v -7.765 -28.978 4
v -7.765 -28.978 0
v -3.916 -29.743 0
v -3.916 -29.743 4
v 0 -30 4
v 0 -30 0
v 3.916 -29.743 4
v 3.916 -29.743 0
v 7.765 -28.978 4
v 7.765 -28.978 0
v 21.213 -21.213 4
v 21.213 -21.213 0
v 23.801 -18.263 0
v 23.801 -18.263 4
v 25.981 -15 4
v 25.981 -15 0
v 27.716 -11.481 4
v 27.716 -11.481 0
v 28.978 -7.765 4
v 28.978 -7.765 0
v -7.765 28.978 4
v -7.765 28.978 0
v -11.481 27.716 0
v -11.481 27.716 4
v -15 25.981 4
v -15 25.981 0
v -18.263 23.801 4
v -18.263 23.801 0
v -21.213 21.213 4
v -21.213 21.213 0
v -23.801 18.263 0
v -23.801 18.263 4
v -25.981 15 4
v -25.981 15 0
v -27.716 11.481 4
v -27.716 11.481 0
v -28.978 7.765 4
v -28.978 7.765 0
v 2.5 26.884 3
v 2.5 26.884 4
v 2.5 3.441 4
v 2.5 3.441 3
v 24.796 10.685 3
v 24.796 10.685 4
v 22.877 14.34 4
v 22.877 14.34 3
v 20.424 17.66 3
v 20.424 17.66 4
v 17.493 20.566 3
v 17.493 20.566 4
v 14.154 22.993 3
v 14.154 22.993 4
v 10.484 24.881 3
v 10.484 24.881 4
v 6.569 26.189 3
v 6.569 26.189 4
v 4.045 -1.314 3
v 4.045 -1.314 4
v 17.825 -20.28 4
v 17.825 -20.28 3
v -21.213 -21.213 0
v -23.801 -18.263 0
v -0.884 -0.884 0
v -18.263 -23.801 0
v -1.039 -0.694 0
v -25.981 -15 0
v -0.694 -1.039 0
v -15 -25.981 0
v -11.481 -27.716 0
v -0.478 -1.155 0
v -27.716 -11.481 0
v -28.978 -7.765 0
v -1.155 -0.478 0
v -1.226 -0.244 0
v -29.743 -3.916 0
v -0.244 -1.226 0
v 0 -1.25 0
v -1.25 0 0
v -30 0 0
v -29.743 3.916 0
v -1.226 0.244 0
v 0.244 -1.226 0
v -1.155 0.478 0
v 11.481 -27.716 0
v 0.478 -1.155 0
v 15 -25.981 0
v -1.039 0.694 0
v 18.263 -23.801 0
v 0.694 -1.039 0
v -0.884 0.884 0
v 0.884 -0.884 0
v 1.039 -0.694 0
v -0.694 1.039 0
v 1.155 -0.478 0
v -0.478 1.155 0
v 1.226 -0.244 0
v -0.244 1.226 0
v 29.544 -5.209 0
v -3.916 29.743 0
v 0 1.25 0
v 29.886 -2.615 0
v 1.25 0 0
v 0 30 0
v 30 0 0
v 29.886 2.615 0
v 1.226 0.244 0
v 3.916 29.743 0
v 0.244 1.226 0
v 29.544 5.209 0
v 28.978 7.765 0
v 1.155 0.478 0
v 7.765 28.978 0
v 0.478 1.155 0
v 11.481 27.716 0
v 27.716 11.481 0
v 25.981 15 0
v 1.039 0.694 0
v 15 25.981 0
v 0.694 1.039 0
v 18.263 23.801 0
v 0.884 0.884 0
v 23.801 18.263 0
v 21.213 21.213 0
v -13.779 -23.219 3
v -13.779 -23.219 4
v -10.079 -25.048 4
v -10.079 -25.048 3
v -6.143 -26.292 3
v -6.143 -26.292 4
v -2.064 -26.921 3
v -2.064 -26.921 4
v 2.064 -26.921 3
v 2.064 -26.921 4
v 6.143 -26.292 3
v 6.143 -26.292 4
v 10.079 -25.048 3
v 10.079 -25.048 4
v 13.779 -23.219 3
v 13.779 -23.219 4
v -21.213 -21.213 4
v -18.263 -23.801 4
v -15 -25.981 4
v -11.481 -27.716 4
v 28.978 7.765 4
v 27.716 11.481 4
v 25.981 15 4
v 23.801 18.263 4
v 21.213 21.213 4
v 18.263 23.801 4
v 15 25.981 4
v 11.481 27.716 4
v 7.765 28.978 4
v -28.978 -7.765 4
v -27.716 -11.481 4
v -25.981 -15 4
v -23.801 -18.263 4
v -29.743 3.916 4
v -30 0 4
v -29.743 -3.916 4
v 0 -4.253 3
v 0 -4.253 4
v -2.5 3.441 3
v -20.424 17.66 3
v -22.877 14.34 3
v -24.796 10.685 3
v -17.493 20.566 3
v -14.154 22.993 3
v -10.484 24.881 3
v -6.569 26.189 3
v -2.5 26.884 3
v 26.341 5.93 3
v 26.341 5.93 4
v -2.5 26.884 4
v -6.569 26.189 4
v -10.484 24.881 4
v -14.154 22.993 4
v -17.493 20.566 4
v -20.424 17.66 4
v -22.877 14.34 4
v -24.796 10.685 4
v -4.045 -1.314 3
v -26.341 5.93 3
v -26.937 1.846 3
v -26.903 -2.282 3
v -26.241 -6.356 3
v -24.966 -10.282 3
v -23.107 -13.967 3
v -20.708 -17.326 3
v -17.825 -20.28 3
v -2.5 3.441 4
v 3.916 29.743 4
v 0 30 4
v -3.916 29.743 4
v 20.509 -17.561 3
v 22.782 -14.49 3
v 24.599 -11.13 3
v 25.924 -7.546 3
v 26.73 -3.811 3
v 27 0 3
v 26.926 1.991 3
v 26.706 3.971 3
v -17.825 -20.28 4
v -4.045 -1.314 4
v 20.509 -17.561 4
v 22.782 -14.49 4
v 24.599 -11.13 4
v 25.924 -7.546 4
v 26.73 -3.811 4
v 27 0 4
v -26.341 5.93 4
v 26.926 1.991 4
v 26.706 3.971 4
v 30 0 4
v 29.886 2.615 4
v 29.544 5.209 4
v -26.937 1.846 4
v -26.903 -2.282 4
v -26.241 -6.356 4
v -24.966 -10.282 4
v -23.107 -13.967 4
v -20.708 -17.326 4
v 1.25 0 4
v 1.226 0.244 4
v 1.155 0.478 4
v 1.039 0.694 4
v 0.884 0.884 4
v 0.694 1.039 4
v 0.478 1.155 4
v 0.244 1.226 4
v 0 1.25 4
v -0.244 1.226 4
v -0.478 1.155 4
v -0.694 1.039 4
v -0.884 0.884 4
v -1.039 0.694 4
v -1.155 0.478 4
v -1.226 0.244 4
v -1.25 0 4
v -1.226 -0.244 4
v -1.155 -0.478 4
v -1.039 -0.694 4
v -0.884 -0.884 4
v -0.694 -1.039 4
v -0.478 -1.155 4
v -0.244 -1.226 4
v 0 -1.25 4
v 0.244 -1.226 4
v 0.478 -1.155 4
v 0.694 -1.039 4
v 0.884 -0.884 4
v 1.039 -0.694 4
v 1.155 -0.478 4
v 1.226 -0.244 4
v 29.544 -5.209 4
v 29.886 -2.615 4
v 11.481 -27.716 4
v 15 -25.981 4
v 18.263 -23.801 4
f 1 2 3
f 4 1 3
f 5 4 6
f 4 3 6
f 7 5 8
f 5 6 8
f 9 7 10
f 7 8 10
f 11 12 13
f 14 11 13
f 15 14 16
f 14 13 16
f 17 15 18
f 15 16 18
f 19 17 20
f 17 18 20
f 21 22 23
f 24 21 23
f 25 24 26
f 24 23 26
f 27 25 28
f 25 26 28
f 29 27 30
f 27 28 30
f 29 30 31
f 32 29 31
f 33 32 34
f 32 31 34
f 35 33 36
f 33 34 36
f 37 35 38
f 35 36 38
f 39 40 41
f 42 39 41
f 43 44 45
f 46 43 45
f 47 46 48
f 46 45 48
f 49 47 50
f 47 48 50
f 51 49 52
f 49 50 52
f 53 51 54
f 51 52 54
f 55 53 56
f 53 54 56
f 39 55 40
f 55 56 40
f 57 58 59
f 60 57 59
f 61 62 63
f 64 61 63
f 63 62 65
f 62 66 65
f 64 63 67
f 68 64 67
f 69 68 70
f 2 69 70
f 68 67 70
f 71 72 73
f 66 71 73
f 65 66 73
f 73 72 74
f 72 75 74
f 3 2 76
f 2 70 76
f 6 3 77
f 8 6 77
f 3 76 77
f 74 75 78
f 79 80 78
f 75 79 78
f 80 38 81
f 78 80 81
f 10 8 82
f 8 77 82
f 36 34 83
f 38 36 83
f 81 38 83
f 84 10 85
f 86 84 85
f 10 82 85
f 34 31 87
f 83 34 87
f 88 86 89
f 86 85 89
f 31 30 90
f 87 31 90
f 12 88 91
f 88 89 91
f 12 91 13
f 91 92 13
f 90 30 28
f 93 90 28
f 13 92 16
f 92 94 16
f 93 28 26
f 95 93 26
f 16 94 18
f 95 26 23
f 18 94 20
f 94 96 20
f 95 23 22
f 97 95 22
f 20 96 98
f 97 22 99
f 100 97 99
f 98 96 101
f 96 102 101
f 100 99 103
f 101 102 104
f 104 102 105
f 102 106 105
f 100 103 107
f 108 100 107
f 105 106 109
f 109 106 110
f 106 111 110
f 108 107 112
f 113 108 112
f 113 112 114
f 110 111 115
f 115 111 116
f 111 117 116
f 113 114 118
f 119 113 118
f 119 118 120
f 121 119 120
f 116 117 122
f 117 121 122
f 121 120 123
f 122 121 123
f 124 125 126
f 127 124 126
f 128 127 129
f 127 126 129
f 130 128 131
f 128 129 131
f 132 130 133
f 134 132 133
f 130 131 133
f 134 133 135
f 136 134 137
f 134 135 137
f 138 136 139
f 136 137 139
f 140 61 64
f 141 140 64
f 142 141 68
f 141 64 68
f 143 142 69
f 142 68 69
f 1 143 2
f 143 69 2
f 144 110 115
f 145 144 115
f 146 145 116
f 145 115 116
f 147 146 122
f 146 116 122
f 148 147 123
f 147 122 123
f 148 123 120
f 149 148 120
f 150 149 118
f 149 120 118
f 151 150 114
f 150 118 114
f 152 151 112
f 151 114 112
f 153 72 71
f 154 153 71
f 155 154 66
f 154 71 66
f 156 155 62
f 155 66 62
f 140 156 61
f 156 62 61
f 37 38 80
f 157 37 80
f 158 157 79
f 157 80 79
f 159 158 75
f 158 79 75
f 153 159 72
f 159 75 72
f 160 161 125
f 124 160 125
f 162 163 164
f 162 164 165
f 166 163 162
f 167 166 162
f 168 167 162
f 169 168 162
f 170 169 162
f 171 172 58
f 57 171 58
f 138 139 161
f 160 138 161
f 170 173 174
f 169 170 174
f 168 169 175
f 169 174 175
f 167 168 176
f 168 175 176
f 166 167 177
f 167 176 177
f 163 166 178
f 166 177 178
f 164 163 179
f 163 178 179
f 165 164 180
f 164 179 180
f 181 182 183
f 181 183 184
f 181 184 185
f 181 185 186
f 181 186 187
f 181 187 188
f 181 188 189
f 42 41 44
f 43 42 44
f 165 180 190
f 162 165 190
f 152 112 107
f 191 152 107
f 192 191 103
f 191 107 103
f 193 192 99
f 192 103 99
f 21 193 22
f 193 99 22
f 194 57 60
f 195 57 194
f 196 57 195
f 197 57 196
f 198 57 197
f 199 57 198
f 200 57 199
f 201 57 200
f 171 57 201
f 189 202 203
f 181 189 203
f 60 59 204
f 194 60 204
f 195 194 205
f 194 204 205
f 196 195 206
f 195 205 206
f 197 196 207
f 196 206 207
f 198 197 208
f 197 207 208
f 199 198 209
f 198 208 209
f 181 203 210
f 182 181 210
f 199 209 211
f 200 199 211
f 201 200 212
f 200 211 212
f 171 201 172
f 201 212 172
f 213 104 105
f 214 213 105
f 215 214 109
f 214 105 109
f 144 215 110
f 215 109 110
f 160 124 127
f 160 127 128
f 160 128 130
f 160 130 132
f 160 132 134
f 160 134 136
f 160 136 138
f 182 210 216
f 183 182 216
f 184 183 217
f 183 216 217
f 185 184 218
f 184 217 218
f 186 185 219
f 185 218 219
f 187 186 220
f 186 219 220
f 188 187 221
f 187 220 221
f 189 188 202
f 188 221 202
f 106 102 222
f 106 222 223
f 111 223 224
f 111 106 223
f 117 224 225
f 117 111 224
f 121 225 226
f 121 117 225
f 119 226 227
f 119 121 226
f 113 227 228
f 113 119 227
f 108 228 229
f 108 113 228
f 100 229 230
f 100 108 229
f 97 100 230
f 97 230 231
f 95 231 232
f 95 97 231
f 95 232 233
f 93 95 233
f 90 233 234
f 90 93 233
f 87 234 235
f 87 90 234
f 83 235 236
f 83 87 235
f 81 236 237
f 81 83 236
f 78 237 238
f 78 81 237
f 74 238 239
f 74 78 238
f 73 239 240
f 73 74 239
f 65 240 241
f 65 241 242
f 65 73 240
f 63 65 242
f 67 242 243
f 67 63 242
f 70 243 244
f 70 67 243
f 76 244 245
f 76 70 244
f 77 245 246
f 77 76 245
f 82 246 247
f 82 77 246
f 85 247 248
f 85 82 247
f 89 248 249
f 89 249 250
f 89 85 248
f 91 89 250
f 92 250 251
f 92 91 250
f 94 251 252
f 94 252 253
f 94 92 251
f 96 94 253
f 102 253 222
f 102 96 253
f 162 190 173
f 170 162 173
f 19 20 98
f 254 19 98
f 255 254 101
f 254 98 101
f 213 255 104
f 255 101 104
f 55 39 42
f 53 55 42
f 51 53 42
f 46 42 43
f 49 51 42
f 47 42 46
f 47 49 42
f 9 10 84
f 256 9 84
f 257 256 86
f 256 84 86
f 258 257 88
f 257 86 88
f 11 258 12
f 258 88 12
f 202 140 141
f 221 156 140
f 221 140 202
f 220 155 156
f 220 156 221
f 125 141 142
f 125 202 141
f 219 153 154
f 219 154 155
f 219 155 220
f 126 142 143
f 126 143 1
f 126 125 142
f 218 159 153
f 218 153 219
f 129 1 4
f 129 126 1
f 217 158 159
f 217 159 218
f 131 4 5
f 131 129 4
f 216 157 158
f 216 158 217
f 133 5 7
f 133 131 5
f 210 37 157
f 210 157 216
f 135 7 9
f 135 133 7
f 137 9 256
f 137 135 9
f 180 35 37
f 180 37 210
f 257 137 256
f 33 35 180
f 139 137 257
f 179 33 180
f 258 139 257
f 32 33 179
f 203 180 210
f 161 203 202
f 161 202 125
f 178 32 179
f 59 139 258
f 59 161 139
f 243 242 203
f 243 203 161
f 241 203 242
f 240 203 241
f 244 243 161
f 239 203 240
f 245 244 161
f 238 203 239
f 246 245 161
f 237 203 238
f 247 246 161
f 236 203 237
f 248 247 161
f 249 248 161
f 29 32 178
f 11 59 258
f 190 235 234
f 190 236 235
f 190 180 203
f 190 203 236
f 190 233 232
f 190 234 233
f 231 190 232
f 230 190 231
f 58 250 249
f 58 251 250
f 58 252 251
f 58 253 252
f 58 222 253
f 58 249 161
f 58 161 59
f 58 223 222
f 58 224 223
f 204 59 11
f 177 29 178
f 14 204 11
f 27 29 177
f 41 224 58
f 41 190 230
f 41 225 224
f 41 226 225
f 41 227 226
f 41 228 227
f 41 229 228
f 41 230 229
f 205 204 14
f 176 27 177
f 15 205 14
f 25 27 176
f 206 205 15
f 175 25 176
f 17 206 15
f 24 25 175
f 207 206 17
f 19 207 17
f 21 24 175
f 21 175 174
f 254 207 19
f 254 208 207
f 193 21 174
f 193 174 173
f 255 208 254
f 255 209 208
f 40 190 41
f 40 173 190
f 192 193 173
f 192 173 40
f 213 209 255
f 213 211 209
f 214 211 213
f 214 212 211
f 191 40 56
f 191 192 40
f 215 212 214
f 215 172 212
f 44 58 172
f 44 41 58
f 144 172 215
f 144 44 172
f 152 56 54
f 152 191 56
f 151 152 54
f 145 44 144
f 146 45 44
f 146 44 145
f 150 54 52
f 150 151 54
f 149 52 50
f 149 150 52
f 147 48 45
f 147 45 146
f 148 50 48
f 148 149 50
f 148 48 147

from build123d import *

# Parameters (mm, degrees)
F0_R     = 1.25
F1_DEPTH = 4
F3_DEPTH = 1


with BuildPart() as f1:
    # F0 (on Top) → F1 (new body)
    with BuildSketch(Plane.XY):
        Polygon((20, 0), (28.9777747887, 7.7645713531), (17.3205080757, 10), (21.2132034356, 21.2132034356), (10, 17.3205080757), (7.7645713531, 28.9777747887), (0, 20), (-7.7645713531, 28.9777747887), (-10, 17.3205080757), (-21.2132034356, 21.2132034356), (-17.3205080757, 10), (-28.9777747887, 7.7645713531), (-20, 0), (-28.9777747887, -7.7645713531), (-17.3205080757, -10), (-21.2132034356, -21.2132034356), (-10, -17.3205080757), (-7.7645713531, -28.9777747887), (0, -20), (7.7645713531, -28.9777747887), (10, -17.3205080757), (21.2132034356, -21.2132034356), (17.3205080757, -10), (28.9777747887, -7.7645713531), align=None)
        Circle(F0_R, mode=Mode.SUBTRACT)
        with BuildLine():
            Line((-20, 0), (-28.9777747887, 7.7645713531))
            ThreePointArc((-28.9777747887, 7.7645713531), (-30, 0), (-28.9777747887, -7.7645713531))
            Line((-28.9777747887, -7.7645713531), (-20, 0))
        make_face()
        with BuildLine():
            Line((-17.3205080757, 10), (-21.2132034356, 21.2132034356))
            ThreePointArc((-21.2132034356, 21.2132034356), (-25.9807621135, 15), (-28.9777747887, 7.7645713531))
            Line((-28.9777747887, 7.7645713531), (-17.3205080757, 10))
        make_face()
        with BuildLine():
            Line((-10, 17.3205080757), (-7.7645713531, 28.9777747887))
            ThreePointArc((-7.7645713531, 28.9777747887), (-15, 25.9807621135), (-21.2132034356, 21.2132034356))
            Line((-21.2132034356, 21.2132034356), (-10, 17.3205080757))
        make_face()
        with BuildLine():
            Line((0, 20), (7.7645713531, 28.9777747887))
            ThreePointArc((7.7645713531, 28.9777747887), (0, 30), (-7.7645713531, 28.9777747887))
            Line((-7.7645713531, 28.9777747887), (0, 20))
        make_face()
        with BuildLine():
            Line((10, 17.3205080757), (21.2132034356, 21.2132034356))
            ThreePointArc((21.2132034356, 21.2132034356), (15, 25.9807621135), (7.7645713531, 28.9777747887))
            Line((7.7645713531, 28.9777747887), (10, 17.3205080757))
        make_face()
        with BuildLine():
            Line((17.3205080757, 10), (28.9777747887, 7.7645713531))
            ThreePointArc((28.9777747887, 7.7645713531), (25.9807621135, 15), (21.2132034356, 21.2132034356))
            Line((21.2132034356, 21.2132034356), (17.3205080757, 10))
        make_face()
        with BuildLine():
            ThreePointArc((28.9777747887, -7.7645713531), (29.7433458412, -3.9157857666), (30, 0))
            ThreePointArc((30, 0), (29.7433458412, 3.9157857666), (28.9777747887, 7.7645713531))
            Line((28.9777747887, 7.7645713531), (20, 0))
            Line((20, 0), (28.9777747887, -7.7645713531))
        make_face()
        with BuildLine():
            ThreePointArc((21.2132034356, -21.2132034356), (25.9807621135, -15), (28.9777747887, -7.7645713531))
            Line((28.9777747887, -7.7645713531), (17.3205080757, -10))
            Line((17.3205080757, -10), (21.2132034356, -21.2132034356))
        make_face()
        with BuildLine():
            ThreePointArc((7.7645713531, -28.9777747887), (15, -25.9807621135), (21.2132034356, -21.2132034356))
            Line((21.2132034356, -21.2132034356), (10, -17.3205080757))
            Line((10, -17.3205080757), (7.7645713531, -28.9777747887))
        make_face()
        with BuildLine():
            ThreePointArc((-7.7645713531, -28.9777747887), (0, -30), (7.7645713531, -28.9777747887))
            Line((7.7645713531, -28.9777747887), (0, -20))
            Line((0, -20), (-7.7645713531, -28.9777747887))
        make_face()
        with BuildLine():
            ThreePointArc((-21.2132034356, -21.2132034356), (-15, -25.9807621135), (-7.7645713531, -28.9777747887))
            Line((-7.7645713531, -28.9777747887), (-10, -17.3205080757))
            Line((-10, -17.3205080757), (-21.2132034356, -21.2132034356))
        make_face()
        with BuildLine():
            ThreePointArc((-28.9777747887, -7.7645713531), (-25.9807621135, -15), (-21.2132034356, -21.2132034356))
            Line((-21.2132034356, -21.2132034356), (-17.3205080757, -10))
            Line((-17.3205080757, -10), (-28.9777747887, -7.7645713531))
        make_face()
    extrude(amount=F1_DEPTH)

    # F2 (on face) → F3 (cut)
    with BuildSketch(Plane.XY.offset(4)):
        with BuildLine():
            Line((-24.7956705205, 10.685257294), (-2.5, 3.4409548012))
            Line((-2.5, 3.4409548012), (-2.5, 26.8840101175))
            ThreePointArc((-2.5, 26.8840101175), (-15.8702018119, 21.8434588481), (-24.7956705205, 10.685257294))
        make_face()
        with BuildLine():
            Line((2.5, 26.8840101175), (2.5, 3.4409548012))
            Line((2.5, 3.4409548012), (24.7956705205, 10.685257294))
            ThreePointArc((24.7956705205, 10.685257294), (15.8702018119, 21.8434588481), (2.5, 26.8840101175))
        make_face()
        with BuildLine():
            Line((26.3407554924, 5.9299747125), (4.0450849719, -1.3143277803))
            Line((4.0450849719, -1.3143277803), (17.8245671555, -20.2801579313))
            ThreePointArc((17.8245671555, -20.2801579313), (24.5994239079, -11.1296155999), (27, 0))
            ThreePointArc((27, 0), (26.8346827659, 2.9832534007), (26.3407554924, 5.9299747125))
        make_face()
        with BuildLine():
            Line((13.7794821836, -23.2190841928), (0, -4.2532540418))
            Line((0, -4.2532540418), (-13.7794821836, -23.2190841928))
            ThreePointArc((-13.7794821836, -23.2190841928), (0, -27), (13.7794821836, -23.2190841928))
        make_face()
        with BuildLine():
            Line((-17.8245671555, -20.2801579313), (-4.0450849719, -1.3143277803))
            Line((-4.0450849719, -1.3143277803), (-26.3407554924, 5.9299747125))
            ThreePointArc((-26.3407554924, 5.9299747125), (-25.67852594, -8.3434588481), (-17.8245671555, -20.2801579313))
        make_face()
    extrude(amount=-F3_DEPTH, mode=Mode.SUBTRACT)


solid = f1.part
